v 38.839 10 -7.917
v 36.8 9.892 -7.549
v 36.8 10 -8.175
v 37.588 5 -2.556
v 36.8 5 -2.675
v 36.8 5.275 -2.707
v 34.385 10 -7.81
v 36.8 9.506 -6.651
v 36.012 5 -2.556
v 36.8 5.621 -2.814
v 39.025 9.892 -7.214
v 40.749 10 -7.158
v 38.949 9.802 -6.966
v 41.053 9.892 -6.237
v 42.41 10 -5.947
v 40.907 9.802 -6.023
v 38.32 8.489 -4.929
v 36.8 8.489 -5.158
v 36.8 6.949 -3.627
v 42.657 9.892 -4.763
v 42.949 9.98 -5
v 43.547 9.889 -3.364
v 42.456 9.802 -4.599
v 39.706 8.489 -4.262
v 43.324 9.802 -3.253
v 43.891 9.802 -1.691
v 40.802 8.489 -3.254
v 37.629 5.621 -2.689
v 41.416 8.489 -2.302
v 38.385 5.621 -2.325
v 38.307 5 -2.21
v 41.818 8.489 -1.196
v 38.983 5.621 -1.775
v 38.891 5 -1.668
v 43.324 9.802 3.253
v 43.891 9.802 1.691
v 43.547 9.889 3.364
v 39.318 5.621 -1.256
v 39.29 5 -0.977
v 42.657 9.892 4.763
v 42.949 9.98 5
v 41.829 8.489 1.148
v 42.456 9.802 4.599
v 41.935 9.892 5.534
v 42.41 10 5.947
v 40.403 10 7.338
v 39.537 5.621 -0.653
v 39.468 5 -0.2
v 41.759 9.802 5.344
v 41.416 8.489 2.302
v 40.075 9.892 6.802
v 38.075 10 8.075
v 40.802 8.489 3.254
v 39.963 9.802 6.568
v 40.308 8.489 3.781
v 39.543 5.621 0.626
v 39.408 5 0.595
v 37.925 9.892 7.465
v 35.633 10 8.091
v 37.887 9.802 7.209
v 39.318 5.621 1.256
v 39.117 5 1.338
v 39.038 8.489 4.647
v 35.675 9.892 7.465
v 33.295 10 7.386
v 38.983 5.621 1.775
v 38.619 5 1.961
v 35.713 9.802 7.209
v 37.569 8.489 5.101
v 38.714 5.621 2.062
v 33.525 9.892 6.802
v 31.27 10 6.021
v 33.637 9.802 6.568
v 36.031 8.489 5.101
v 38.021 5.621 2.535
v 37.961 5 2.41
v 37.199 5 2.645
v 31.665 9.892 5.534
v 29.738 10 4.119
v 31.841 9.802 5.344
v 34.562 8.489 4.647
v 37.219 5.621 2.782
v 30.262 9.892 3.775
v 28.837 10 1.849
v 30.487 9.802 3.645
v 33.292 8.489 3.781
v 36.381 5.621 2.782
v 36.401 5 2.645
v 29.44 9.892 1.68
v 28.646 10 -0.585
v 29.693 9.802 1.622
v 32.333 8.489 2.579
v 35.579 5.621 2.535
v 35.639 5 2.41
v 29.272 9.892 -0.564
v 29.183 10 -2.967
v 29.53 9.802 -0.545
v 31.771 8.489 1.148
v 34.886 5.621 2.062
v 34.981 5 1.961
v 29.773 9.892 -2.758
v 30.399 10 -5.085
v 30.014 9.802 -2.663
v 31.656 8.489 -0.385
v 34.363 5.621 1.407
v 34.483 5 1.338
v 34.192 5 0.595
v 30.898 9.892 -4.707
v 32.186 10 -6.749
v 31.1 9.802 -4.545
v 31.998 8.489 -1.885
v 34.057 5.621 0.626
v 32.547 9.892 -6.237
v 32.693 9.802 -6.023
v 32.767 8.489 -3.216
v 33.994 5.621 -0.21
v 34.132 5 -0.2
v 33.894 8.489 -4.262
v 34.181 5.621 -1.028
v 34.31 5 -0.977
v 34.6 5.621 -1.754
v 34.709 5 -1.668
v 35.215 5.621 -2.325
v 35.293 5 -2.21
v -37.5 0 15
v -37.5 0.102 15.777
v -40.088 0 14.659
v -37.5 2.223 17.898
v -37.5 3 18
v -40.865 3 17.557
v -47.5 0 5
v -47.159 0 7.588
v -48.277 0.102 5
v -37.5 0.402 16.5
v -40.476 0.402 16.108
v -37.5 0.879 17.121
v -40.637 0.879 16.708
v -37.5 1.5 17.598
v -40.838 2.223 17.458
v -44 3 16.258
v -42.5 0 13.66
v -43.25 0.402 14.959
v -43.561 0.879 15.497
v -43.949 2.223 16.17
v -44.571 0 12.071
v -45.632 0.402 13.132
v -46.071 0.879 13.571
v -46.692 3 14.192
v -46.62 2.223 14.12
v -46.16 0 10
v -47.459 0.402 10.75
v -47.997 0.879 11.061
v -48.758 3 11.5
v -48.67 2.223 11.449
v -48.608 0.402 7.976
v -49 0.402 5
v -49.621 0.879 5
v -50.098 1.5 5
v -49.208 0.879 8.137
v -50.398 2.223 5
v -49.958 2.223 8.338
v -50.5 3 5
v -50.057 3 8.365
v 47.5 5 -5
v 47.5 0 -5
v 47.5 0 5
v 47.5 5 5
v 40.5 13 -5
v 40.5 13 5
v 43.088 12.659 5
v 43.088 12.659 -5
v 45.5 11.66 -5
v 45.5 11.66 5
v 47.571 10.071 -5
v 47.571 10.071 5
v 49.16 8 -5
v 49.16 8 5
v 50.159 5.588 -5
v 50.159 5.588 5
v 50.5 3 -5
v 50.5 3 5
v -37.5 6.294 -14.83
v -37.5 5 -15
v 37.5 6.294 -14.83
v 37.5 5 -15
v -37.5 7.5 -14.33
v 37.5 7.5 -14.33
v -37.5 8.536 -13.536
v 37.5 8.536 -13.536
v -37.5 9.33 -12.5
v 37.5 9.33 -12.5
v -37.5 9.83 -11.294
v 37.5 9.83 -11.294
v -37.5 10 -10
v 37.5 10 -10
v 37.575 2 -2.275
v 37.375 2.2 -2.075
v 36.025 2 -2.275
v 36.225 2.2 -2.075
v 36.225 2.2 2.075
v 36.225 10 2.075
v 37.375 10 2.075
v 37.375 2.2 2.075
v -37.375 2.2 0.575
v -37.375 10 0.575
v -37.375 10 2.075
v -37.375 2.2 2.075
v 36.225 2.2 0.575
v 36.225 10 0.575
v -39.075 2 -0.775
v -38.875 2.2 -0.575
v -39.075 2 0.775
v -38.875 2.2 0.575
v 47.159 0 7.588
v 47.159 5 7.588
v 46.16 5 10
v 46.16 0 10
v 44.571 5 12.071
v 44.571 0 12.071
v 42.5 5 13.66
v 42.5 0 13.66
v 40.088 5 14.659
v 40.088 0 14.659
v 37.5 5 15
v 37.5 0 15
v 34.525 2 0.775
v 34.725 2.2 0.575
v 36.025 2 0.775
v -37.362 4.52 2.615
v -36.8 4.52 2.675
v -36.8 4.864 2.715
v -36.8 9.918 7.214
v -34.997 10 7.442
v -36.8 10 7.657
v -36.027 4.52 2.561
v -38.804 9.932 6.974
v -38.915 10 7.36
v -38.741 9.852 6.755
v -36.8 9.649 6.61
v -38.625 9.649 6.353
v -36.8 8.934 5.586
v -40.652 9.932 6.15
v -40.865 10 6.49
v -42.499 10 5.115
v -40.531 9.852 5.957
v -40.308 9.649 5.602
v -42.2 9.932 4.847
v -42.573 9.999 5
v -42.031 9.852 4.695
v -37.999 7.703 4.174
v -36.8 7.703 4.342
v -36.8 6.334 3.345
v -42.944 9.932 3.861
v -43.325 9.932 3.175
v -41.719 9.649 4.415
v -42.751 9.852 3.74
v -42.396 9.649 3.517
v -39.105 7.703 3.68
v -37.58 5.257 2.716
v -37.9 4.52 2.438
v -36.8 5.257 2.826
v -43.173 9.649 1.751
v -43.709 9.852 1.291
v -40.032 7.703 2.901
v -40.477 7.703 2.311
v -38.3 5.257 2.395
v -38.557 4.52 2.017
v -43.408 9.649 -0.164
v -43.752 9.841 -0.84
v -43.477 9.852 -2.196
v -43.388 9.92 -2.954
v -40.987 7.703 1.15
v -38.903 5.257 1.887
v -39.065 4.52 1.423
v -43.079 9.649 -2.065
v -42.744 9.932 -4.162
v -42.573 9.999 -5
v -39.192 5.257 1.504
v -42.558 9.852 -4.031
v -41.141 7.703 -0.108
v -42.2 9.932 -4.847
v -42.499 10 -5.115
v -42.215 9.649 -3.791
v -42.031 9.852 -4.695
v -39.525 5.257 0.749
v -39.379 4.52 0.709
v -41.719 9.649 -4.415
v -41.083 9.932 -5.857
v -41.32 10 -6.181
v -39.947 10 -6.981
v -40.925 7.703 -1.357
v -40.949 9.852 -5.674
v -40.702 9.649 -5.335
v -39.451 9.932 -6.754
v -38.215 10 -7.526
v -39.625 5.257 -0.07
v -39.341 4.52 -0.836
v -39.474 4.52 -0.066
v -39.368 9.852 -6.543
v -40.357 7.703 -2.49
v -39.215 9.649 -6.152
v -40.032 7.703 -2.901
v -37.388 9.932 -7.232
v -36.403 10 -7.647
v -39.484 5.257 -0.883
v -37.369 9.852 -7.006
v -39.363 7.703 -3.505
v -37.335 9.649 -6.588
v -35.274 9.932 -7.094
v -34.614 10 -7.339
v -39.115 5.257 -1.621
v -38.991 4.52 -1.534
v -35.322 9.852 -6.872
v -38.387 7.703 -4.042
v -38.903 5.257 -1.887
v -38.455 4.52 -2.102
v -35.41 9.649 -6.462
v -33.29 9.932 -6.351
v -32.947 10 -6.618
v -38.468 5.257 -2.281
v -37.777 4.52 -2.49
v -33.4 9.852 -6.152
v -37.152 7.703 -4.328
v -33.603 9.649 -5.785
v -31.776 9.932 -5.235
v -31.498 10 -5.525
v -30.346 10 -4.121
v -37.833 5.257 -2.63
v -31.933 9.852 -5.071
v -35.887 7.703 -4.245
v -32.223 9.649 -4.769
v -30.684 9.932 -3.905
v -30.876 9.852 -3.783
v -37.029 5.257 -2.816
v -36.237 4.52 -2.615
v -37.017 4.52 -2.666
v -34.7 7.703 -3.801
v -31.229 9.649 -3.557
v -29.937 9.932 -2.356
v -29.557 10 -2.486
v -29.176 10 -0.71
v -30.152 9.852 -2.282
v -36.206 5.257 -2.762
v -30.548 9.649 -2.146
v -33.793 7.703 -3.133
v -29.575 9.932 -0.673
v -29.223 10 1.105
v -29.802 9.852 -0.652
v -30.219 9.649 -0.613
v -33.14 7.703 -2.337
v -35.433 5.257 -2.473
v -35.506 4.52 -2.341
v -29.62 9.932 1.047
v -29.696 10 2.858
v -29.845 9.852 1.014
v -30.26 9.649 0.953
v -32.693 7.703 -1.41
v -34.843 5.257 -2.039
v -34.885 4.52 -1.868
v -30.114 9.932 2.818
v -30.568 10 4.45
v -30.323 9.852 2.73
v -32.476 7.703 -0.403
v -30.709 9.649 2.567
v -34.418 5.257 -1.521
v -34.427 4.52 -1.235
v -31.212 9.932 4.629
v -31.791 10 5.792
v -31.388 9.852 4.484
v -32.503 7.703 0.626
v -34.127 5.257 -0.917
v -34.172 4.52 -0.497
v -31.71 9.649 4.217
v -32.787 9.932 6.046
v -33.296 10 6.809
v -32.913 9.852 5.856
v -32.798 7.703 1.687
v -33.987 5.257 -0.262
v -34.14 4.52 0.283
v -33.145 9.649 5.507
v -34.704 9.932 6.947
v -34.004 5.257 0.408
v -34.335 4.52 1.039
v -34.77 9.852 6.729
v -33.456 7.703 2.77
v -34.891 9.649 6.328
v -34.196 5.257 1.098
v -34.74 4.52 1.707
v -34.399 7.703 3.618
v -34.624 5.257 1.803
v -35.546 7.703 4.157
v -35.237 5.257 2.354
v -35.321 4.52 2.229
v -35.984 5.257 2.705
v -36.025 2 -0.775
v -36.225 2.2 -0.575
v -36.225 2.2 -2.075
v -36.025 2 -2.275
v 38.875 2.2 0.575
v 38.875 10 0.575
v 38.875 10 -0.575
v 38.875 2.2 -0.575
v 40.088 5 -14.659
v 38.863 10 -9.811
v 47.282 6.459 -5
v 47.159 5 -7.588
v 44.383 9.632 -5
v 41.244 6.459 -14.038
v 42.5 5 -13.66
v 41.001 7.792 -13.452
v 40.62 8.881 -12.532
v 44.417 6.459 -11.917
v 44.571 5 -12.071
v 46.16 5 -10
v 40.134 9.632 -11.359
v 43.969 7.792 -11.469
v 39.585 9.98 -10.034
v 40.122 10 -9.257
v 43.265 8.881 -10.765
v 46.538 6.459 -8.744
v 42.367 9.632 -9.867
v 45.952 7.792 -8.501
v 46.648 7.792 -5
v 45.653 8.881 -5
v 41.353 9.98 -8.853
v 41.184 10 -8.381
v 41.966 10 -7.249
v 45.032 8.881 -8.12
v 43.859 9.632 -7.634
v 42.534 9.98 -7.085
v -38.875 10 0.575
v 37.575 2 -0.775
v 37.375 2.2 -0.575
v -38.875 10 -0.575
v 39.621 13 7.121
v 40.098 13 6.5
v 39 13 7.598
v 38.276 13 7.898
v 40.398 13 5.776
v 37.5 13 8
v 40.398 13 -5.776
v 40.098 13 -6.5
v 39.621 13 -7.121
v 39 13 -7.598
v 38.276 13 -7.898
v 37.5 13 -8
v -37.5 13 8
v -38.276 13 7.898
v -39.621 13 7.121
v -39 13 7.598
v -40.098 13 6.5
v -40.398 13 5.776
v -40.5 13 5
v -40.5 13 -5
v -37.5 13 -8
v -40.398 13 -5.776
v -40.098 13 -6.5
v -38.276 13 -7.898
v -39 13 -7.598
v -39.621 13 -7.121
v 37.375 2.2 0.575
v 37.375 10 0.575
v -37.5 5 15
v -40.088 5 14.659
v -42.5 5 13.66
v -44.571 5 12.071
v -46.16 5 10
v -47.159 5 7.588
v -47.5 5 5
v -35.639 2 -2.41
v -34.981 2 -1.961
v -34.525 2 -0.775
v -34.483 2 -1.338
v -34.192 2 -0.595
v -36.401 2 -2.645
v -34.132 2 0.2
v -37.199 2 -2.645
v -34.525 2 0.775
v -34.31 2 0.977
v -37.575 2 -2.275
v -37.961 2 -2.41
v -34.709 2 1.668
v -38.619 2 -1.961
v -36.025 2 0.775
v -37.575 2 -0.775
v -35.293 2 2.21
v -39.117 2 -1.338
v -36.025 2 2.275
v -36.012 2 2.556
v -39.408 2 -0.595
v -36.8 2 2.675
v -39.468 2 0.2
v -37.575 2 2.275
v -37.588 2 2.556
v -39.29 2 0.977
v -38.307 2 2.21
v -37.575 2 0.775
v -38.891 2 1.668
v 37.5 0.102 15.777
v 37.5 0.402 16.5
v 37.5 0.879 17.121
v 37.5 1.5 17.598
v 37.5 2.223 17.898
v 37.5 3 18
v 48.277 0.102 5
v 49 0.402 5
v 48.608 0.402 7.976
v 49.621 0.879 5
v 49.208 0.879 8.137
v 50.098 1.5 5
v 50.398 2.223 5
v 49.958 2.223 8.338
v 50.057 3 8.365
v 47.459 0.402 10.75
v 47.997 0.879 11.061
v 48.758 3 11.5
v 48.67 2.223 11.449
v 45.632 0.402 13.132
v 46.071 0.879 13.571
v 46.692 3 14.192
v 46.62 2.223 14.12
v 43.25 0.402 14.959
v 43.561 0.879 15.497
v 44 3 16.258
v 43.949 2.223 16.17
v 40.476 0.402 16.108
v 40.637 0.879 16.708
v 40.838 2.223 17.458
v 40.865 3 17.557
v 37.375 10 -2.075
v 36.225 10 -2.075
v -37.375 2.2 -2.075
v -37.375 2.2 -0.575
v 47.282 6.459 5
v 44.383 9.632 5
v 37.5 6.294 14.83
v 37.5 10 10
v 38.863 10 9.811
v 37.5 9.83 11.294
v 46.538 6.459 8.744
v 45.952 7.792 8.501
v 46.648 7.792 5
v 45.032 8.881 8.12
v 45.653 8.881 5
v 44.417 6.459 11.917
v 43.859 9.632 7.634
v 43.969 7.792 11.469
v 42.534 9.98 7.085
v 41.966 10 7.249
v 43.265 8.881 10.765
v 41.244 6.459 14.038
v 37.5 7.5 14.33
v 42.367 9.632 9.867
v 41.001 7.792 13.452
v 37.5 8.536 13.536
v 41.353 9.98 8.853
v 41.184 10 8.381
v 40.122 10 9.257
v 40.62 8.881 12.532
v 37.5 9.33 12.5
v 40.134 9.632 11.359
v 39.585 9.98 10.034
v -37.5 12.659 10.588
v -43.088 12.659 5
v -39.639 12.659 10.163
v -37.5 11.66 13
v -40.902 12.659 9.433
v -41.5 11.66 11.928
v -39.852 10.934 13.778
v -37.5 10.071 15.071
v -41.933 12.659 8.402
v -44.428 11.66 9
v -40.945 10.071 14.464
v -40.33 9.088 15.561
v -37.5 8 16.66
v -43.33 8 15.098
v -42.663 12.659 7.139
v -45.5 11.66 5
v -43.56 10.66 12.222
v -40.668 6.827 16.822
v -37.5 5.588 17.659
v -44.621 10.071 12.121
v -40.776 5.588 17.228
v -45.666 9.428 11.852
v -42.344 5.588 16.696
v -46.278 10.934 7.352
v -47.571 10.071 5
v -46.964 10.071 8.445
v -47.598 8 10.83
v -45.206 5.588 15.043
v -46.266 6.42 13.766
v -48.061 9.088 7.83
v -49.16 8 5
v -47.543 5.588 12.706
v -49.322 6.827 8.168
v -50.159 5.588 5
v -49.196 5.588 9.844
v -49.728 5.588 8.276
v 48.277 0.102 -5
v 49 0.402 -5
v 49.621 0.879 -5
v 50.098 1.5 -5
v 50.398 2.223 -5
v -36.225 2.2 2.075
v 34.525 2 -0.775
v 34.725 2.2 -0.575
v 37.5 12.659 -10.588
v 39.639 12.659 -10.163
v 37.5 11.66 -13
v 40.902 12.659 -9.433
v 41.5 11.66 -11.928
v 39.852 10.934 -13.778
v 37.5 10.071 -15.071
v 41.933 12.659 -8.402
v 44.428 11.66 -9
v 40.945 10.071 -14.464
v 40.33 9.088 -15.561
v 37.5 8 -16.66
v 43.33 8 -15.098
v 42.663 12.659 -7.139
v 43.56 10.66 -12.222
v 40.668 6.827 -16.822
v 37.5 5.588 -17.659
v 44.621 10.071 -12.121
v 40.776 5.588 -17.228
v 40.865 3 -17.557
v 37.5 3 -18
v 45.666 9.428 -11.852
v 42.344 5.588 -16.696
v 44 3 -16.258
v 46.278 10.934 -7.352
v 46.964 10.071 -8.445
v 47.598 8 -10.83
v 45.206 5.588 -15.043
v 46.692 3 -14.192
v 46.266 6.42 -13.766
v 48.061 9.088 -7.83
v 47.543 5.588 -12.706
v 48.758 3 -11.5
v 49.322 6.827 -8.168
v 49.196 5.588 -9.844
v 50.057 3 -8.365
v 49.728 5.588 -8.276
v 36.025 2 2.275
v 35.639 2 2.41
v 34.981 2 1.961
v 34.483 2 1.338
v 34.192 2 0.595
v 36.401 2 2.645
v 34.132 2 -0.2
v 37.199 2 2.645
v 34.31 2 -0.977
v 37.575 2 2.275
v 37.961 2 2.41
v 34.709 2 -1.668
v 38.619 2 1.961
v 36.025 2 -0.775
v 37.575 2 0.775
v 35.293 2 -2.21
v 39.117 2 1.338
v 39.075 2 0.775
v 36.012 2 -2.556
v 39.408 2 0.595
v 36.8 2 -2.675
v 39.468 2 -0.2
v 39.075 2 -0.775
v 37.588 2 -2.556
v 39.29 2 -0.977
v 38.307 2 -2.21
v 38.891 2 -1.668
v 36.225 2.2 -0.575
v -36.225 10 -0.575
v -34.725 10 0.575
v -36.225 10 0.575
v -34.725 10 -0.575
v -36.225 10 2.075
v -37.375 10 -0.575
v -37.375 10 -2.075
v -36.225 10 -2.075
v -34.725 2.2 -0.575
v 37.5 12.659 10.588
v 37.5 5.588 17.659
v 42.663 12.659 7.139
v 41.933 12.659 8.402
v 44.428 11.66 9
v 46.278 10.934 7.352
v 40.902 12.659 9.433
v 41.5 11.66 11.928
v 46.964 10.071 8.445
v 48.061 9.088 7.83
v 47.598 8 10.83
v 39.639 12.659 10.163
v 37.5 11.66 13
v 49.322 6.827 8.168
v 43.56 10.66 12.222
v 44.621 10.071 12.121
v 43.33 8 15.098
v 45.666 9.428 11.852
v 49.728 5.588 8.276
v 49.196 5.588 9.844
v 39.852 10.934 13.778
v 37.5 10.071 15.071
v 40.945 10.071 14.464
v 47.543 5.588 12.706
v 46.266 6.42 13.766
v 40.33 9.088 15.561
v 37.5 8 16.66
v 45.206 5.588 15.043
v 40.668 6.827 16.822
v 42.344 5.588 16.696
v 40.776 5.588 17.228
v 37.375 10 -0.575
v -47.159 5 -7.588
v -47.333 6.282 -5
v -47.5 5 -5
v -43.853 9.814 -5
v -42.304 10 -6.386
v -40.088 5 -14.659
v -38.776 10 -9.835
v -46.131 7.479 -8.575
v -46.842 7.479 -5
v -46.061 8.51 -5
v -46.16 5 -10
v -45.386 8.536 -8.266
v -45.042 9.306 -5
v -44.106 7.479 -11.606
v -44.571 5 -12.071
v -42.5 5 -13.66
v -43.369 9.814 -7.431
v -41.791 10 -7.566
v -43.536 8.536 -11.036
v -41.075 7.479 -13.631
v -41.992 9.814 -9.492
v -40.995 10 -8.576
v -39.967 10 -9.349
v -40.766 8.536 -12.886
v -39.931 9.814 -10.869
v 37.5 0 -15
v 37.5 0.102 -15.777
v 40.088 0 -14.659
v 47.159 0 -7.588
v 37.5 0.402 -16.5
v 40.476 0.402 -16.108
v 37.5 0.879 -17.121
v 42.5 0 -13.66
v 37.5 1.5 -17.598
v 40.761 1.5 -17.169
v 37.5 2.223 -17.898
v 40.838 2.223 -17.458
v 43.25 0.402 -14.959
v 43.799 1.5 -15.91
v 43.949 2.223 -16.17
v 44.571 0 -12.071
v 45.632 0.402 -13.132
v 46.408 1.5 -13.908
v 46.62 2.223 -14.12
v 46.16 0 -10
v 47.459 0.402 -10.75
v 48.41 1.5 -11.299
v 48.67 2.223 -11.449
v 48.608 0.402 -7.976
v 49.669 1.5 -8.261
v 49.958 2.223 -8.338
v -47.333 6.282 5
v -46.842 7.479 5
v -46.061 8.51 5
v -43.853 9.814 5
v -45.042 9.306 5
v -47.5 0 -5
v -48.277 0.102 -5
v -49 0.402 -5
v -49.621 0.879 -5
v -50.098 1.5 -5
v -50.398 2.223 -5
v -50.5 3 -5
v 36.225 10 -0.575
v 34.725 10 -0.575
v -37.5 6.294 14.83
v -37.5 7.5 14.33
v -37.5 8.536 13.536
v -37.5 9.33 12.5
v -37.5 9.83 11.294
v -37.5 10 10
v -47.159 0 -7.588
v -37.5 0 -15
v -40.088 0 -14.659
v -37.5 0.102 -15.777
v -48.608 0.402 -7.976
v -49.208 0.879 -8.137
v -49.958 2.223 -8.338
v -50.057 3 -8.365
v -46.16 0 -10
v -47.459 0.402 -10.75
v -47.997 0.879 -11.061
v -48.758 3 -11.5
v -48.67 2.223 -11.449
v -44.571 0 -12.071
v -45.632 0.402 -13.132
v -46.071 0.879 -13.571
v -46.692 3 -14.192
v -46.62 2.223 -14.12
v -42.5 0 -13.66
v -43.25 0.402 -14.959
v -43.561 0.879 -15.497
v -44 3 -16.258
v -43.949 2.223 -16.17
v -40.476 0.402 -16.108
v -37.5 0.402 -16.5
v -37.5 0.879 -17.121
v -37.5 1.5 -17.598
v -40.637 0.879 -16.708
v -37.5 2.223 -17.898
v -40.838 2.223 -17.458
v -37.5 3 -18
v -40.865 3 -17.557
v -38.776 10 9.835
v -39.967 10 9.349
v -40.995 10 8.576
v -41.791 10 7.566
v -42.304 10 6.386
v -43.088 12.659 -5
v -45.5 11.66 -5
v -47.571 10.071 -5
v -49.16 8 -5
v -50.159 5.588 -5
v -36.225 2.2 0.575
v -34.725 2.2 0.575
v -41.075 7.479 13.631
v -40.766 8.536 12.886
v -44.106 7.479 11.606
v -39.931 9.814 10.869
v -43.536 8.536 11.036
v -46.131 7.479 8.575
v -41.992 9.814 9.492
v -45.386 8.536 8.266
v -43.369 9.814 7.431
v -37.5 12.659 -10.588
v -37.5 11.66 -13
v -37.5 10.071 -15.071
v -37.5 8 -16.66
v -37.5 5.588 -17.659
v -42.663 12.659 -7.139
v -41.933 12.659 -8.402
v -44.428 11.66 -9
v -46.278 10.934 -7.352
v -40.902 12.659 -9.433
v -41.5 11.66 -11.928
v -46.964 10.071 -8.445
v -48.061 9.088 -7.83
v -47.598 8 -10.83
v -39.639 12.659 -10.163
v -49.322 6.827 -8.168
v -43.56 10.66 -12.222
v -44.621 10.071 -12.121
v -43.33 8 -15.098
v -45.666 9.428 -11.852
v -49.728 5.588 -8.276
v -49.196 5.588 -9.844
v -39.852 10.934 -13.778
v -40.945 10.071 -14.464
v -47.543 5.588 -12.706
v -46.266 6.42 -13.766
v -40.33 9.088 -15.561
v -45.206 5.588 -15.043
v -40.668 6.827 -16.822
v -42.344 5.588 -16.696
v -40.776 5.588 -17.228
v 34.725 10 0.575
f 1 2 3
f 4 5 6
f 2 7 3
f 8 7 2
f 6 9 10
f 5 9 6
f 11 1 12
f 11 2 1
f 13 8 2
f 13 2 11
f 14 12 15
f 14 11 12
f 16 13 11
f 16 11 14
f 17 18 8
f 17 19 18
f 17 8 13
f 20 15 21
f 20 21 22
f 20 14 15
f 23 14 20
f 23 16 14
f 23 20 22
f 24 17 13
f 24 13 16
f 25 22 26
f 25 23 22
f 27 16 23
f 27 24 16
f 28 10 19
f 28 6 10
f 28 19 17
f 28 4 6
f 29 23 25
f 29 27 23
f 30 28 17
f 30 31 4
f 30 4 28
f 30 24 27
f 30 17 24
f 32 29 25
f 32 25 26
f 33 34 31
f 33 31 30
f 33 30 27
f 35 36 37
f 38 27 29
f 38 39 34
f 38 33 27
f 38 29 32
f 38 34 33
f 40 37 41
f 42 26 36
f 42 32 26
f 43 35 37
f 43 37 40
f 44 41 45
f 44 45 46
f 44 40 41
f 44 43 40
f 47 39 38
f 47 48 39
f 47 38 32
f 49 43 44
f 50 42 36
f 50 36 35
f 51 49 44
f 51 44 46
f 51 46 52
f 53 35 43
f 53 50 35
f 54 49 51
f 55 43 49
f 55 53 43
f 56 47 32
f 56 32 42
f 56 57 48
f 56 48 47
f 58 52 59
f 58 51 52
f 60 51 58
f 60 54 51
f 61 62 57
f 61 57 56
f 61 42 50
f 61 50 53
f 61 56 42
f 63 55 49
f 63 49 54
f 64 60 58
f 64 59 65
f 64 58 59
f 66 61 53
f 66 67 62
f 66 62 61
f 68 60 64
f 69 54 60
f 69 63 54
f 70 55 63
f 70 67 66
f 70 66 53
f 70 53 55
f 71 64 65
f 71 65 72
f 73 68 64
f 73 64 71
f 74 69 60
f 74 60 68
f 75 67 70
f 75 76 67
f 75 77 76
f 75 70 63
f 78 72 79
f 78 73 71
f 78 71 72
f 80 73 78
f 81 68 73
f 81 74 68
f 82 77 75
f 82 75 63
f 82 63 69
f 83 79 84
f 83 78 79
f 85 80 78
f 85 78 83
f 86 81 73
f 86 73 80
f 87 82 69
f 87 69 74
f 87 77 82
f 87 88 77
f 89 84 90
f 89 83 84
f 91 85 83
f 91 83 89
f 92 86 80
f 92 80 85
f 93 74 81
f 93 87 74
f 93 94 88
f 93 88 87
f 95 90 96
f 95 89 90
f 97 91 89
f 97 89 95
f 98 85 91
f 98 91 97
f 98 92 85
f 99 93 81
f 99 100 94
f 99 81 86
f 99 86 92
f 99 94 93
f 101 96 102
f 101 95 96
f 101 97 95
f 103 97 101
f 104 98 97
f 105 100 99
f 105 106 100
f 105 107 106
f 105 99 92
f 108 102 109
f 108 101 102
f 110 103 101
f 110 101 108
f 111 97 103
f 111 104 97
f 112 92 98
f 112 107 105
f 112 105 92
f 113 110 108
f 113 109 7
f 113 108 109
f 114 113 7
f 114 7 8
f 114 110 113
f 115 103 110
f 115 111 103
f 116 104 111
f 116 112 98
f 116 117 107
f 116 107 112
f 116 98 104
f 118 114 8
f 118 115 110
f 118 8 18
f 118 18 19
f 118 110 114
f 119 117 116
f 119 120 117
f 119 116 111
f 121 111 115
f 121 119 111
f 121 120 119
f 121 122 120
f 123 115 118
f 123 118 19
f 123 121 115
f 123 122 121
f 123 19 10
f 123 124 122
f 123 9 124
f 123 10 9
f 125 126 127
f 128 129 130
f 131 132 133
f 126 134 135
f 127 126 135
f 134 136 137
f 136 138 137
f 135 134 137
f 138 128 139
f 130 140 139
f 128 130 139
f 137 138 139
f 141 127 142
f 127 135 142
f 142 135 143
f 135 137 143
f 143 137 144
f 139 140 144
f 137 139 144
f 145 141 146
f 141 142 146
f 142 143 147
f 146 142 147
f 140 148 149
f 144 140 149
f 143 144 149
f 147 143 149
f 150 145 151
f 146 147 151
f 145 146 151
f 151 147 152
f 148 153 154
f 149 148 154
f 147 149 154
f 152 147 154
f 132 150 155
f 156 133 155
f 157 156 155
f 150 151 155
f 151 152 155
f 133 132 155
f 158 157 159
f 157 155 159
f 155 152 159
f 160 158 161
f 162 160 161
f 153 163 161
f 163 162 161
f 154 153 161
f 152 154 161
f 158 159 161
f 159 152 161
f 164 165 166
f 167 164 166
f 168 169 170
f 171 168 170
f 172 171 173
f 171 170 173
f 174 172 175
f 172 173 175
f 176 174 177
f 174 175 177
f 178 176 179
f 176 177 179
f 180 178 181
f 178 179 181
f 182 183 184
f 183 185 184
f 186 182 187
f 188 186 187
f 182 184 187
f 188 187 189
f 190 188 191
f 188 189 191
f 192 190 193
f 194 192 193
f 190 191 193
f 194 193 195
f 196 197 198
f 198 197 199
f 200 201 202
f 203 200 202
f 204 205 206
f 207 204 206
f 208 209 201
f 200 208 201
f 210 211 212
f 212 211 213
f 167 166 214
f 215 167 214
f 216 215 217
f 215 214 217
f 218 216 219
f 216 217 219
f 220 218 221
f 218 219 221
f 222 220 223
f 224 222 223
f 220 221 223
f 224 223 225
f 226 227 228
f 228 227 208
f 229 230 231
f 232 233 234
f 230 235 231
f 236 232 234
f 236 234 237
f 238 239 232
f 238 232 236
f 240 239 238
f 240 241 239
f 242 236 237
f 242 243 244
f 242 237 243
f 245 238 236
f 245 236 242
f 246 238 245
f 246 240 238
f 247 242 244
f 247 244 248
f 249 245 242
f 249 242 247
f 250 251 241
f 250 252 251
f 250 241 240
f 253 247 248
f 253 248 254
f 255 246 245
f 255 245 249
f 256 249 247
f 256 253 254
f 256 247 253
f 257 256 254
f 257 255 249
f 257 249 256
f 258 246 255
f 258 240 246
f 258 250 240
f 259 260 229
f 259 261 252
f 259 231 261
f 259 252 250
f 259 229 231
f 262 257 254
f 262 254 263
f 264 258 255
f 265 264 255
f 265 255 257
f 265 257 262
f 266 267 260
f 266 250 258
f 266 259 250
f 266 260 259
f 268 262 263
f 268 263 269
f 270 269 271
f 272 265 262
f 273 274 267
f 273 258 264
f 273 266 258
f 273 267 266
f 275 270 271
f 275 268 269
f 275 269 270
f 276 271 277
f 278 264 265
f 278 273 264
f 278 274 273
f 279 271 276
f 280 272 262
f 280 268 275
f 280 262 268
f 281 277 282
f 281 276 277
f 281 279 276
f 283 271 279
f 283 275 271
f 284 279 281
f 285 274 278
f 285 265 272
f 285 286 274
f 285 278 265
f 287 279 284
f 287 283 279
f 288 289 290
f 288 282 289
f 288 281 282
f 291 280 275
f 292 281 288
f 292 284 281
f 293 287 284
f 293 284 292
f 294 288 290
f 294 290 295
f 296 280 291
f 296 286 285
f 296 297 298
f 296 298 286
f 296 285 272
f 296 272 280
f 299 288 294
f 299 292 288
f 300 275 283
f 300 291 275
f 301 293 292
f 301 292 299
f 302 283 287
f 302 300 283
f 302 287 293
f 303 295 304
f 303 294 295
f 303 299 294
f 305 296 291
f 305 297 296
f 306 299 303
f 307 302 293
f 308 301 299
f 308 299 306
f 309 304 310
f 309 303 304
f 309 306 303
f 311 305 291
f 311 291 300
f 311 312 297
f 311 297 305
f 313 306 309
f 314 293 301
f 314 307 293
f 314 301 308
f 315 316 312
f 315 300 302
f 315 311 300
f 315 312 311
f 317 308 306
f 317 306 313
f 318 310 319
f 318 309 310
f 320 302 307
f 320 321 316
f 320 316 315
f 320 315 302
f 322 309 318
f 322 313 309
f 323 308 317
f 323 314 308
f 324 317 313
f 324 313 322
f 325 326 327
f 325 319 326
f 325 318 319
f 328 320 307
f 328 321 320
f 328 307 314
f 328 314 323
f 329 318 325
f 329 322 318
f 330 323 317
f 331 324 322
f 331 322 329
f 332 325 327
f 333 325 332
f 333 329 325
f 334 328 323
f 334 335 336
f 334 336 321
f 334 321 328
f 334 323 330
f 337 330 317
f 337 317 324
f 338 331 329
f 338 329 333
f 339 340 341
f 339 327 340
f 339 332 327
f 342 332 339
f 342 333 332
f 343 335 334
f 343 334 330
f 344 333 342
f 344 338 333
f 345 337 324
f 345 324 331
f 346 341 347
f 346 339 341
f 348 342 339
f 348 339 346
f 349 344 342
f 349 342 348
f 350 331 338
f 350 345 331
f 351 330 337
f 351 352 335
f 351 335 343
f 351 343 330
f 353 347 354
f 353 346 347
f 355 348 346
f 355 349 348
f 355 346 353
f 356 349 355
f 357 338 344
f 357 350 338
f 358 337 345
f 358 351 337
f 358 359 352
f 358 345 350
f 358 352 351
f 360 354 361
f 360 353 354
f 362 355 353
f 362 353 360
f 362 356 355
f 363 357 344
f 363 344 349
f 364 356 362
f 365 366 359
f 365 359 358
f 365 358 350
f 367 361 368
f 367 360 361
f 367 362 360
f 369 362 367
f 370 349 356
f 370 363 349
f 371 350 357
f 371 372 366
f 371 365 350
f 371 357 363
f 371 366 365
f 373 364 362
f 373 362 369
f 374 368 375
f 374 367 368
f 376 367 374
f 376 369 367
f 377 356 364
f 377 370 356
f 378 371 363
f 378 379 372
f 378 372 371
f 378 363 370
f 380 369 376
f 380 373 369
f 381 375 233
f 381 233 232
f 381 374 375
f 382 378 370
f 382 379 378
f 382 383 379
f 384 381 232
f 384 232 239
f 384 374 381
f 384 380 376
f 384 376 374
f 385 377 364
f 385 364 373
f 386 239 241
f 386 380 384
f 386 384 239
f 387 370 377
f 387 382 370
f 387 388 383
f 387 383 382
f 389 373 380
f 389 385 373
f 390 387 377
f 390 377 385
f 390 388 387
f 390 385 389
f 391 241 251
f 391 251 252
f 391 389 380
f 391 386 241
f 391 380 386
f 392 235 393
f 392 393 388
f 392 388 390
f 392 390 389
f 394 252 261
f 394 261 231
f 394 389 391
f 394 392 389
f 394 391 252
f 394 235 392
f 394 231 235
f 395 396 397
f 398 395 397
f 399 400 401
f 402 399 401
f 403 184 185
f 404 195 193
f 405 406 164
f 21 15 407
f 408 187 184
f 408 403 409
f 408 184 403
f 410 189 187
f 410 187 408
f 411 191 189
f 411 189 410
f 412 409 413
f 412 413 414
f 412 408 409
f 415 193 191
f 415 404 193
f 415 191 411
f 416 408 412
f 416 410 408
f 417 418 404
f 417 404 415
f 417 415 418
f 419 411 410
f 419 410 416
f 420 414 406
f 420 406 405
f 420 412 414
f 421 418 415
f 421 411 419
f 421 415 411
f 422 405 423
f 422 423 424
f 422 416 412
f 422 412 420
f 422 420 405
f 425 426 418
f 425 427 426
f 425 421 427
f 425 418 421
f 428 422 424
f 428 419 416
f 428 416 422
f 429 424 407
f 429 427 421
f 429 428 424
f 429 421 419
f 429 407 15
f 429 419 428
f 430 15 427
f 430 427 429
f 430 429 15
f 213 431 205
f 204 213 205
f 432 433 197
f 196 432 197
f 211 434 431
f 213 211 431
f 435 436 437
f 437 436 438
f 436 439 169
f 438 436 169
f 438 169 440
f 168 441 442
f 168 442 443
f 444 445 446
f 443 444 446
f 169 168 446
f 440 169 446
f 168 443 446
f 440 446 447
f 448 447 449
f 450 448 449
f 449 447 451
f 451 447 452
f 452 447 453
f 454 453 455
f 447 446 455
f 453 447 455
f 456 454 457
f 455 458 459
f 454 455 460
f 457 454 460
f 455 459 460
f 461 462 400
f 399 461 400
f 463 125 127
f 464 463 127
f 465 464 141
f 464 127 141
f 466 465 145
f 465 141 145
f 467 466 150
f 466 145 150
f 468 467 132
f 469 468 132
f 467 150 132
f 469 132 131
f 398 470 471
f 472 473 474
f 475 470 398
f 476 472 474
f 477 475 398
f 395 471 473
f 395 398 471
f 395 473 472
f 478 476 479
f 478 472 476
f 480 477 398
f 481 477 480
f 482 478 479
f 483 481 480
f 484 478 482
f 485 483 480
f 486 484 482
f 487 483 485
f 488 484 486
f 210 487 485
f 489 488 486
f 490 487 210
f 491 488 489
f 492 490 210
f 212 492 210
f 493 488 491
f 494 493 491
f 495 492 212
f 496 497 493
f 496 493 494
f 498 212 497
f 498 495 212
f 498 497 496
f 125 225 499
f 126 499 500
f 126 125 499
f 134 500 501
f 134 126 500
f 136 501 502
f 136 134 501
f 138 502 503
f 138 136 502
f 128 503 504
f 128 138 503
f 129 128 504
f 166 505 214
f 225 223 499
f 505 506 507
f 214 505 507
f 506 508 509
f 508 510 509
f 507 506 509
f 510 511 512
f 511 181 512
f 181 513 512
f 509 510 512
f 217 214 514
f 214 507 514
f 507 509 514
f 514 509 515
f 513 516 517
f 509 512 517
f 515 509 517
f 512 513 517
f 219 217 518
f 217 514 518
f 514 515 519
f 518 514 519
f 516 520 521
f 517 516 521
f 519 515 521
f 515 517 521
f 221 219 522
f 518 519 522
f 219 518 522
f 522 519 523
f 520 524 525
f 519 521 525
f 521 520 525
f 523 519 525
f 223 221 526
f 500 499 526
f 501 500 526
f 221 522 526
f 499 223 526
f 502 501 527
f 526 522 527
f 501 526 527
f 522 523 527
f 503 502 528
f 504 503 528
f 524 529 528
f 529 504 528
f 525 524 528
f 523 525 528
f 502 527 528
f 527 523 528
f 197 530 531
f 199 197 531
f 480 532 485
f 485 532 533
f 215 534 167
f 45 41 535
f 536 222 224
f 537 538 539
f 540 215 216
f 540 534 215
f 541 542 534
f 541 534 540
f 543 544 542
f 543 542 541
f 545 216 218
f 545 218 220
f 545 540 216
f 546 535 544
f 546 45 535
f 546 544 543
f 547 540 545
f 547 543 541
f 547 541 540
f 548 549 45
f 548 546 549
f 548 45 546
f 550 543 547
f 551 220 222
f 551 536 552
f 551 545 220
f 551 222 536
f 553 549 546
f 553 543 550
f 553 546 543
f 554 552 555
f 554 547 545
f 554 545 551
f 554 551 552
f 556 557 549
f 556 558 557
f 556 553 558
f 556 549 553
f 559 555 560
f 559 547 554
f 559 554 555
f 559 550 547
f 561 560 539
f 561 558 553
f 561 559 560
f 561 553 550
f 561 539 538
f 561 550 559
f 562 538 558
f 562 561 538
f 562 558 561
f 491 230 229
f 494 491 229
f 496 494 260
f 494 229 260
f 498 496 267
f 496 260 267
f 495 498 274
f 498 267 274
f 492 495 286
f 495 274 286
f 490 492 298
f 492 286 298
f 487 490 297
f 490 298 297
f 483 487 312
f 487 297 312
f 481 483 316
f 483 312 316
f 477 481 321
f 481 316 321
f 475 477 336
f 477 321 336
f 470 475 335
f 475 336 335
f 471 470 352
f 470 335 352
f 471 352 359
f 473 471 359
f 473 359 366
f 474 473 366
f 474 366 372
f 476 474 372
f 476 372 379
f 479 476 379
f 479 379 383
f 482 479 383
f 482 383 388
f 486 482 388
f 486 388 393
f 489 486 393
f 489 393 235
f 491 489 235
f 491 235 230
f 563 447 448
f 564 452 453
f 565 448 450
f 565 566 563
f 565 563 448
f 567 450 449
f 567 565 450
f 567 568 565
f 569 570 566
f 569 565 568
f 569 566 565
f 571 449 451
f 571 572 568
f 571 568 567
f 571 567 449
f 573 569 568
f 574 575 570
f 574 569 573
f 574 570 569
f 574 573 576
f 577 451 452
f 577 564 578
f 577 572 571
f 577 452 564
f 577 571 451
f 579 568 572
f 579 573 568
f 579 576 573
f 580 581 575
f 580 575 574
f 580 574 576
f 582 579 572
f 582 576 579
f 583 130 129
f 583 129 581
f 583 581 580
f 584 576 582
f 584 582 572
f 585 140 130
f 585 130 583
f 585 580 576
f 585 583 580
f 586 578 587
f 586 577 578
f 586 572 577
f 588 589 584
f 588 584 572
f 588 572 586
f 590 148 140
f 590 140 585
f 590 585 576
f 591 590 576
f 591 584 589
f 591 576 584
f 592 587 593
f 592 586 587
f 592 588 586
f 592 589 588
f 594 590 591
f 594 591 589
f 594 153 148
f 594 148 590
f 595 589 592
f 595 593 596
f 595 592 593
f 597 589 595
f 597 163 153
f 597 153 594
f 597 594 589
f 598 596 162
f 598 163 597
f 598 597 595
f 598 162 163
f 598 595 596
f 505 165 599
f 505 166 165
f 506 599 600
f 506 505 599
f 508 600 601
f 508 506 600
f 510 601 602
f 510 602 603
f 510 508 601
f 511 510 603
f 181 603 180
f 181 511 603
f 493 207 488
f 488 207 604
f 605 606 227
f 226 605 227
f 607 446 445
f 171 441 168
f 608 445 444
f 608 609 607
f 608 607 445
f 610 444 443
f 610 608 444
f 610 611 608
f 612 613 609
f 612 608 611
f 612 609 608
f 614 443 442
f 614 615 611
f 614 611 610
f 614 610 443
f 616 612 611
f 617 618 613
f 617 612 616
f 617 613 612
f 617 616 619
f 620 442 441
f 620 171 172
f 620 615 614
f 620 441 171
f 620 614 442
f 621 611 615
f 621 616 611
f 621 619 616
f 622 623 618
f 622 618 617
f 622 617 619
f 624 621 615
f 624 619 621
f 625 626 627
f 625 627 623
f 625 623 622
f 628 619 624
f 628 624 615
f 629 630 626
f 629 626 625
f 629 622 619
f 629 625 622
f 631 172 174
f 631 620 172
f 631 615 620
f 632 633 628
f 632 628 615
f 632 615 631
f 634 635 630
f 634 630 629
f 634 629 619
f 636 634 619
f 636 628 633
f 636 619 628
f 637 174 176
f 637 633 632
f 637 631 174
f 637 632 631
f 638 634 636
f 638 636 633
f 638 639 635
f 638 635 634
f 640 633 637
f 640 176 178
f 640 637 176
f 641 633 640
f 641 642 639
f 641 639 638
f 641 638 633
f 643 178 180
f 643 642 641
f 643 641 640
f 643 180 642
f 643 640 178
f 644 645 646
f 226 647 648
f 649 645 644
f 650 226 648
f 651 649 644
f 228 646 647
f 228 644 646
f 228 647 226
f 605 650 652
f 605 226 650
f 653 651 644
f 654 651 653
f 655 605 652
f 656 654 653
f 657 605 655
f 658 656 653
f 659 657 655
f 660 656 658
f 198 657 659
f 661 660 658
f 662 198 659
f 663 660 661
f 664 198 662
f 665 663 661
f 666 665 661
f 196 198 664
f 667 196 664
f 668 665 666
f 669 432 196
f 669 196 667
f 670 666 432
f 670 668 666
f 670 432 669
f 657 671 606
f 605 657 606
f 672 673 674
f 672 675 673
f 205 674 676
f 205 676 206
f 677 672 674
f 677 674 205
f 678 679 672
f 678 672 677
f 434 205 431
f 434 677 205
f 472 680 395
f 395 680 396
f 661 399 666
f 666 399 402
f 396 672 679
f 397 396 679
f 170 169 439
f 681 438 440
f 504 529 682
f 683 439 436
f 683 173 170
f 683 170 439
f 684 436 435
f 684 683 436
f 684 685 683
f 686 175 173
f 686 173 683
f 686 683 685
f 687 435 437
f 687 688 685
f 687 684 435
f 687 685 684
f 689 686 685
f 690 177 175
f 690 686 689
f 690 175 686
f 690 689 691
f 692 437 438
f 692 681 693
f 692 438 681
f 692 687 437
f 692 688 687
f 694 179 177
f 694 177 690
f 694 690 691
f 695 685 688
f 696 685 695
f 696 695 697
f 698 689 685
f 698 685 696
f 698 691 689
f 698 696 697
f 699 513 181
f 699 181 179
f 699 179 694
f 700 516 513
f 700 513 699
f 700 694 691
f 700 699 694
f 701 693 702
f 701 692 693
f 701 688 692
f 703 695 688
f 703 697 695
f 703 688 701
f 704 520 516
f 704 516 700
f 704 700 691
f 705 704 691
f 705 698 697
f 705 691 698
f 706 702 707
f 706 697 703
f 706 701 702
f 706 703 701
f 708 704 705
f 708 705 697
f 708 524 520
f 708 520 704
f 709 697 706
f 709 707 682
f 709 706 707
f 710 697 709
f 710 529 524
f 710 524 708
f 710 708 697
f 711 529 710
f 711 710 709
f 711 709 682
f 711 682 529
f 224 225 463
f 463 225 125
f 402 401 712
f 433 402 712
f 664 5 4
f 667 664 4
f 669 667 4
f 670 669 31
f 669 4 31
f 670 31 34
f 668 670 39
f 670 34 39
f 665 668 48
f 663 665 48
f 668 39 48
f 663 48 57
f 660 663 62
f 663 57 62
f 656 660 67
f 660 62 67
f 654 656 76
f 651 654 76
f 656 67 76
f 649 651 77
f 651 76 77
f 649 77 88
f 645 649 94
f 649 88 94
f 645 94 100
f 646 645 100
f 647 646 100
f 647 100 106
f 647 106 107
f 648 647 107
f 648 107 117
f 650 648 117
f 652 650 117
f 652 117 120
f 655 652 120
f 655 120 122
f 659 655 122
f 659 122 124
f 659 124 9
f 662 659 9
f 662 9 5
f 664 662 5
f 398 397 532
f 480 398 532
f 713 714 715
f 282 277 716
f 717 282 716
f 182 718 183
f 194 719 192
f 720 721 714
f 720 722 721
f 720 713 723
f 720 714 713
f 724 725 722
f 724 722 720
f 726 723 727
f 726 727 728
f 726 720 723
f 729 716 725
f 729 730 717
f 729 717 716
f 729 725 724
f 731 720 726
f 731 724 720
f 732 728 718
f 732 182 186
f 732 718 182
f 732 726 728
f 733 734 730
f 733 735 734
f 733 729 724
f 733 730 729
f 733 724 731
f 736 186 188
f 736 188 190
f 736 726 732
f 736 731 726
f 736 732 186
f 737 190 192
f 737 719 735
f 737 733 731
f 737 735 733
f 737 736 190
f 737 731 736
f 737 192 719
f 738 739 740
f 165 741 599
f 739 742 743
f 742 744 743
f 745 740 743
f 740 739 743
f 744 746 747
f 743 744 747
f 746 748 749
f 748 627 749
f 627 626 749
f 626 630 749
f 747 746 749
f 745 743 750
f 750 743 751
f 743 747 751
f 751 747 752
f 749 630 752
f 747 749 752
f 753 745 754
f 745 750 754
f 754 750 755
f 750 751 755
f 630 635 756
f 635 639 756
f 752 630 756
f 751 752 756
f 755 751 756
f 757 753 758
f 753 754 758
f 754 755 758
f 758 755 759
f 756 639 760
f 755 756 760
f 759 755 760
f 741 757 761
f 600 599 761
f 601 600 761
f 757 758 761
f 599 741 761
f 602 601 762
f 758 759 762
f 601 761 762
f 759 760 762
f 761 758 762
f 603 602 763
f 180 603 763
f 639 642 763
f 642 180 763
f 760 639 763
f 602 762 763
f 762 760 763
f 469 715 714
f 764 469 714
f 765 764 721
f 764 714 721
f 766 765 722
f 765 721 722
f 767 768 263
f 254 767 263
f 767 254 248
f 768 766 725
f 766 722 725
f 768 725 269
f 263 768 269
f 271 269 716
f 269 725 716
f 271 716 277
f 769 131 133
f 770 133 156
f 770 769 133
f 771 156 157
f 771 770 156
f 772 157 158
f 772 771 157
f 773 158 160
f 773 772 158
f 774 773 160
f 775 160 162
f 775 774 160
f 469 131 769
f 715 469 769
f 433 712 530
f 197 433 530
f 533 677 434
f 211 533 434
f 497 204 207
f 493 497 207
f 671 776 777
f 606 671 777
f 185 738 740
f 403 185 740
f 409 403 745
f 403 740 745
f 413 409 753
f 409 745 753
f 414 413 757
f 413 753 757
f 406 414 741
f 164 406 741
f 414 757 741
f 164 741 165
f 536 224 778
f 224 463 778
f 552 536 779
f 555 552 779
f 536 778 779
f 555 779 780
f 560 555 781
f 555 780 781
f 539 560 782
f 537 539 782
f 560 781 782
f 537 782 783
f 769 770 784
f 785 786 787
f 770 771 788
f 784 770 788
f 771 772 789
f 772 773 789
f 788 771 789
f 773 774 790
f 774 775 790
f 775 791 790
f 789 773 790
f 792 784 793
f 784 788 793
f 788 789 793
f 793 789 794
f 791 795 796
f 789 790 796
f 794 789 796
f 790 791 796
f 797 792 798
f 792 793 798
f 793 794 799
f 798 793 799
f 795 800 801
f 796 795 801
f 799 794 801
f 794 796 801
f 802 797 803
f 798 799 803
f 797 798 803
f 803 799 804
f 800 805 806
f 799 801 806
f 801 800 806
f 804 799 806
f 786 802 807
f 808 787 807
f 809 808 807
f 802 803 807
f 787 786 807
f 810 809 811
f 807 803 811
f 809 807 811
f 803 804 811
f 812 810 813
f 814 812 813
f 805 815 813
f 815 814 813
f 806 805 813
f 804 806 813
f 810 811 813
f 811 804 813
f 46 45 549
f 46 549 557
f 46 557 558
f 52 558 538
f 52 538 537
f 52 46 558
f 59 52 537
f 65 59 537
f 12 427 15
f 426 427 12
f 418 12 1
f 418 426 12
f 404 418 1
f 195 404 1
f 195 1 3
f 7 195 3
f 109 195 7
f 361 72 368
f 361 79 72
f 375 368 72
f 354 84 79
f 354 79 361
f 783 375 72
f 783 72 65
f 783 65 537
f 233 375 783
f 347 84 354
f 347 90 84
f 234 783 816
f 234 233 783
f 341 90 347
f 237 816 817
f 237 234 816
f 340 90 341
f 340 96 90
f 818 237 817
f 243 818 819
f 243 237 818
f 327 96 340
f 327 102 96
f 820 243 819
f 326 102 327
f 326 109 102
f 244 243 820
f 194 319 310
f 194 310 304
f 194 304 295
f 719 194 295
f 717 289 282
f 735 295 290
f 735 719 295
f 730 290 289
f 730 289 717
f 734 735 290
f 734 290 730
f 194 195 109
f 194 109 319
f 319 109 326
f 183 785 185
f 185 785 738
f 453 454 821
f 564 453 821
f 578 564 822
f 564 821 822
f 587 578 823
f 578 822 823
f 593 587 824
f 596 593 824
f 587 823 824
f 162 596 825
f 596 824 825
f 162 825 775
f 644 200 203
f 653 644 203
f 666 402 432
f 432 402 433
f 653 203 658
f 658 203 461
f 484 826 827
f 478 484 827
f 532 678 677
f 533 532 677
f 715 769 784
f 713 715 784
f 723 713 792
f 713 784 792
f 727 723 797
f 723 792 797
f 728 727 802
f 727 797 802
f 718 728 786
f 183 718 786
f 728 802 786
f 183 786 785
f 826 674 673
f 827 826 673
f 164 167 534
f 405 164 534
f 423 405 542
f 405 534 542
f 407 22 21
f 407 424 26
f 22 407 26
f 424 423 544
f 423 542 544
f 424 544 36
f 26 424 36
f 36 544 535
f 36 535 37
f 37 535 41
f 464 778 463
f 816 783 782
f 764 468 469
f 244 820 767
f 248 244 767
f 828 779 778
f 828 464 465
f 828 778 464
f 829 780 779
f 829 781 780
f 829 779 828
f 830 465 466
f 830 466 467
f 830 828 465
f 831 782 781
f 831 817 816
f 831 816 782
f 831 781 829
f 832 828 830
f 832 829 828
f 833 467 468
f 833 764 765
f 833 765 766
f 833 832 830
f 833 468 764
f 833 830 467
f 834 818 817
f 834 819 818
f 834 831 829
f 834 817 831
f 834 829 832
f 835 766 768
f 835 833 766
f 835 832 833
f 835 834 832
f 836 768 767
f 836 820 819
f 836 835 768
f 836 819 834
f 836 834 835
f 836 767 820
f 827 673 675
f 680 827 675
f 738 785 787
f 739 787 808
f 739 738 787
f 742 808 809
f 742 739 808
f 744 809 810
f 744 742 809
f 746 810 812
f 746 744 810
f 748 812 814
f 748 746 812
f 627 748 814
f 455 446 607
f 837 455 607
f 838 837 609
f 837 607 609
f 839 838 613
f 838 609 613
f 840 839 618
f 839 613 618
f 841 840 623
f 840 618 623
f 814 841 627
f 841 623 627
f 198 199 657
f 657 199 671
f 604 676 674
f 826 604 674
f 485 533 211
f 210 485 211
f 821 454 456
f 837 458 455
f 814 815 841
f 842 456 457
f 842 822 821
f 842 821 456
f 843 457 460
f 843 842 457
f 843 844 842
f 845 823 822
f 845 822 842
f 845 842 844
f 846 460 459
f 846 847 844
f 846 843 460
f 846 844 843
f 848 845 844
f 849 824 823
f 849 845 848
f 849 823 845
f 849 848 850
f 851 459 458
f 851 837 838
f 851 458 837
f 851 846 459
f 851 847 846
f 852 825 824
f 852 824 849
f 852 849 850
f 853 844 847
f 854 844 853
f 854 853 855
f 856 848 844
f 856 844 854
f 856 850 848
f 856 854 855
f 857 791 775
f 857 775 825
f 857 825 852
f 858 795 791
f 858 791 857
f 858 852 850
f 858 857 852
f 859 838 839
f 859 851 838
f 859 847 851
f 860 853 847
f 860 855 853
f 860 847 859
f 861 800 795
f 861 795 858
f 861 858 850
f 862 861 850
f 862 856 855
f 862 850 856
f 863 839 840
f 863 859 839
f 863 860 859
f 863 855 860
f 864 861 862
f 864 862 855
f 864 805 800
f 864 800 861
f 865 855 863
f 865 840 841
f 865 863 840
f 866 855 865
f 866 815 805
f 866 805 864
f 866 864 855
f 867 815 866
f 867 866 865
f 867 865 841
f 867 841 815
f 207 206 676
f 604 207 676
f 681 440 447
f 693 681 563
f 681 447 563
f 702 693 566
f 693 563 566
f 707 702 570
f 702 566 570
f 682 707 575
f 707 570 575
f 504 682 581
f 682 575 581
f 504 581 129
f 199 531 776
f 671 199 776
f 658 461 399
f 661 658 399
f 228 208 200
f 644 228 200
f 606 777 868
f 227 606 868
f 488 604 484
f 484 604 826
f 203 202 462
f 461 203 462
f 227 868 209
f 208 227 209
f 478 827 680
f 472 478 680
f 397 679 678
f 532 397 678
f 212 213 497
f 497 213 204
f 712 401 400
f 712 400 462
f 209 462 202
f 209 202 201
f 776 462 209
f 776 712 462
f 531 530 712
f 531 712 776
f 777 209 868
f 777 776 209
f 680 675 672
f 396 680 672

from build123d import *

# Parameters (mm, degrees)
EXTRUDE_1_DEPTH = 10
SHELL_2_T       = 3
FILLET_3_R      = 10
FILLET_4_R      = 3
SKETCH_2_R      = 2.675
EXTRUDE_2_DEPTH = 8
FILLET_7_R      = 5
CHAMFER_1_SIZE  = 0.2
CHAMFER_2_SIZE  = 0.2
FILLET_9_SIZE   = 5.5
FILLET_9_SIZE_2 = 5


# Some blends are built 0.0001 mm under size
with BuildPart() as part:
    # 草图1 → 凸台-拉伸1 (new body)
    with BuildSketch(Plane(origin=(0, 0, 0), x_dir=(1, 0, 0), z_dir=(0, 1, 0))):
        with BuildLine():
            Line((-37.5, 15), (37.5, 15))
            ThreePointArc((37.5, 15), (44.571067812, 12.071067812), (47.5, 5))
            Line((47.5, 5), (47.5, -5))
            ThreePointArc((47.5, -5), (44.571067812, -12.071067812), (37.5, -15))
            Line((37.5, -15), (-37.5, -15))
            ThreePointArc((-37.5, -15), (-44.571067812, -12.071067812), (-47.5, -5))
            Line((-47.5, -5), (-47.5, 5))
            ThreePointArc((-47.5, 5), (-44.571067812, 12.071067812), (-37.5, 15))
        make_face()
    extrude(amount=EXTRUDE_1_DEPTH)

    # 抽壳2
    shell_2_openings = [part.faces().sort_by_distance(p)[0] for p in [
        (0, 0, 0),
    ]]
    offset(amount=SHELL_2_T, openings=shell_2_openings, kind=Kind.INTERSECTION)

    # 圆角3
    # the kernel refuses this fillet: 10 mm, written as the material it takes off along each edge
    with BuildSketch(Plane(origin=(37.5, 13, 5), x_dir=(1, 0, 0), z_dir=(0, 0, -1))) as fillet_3_piece_1:
        with BuildLine():
            CenterArc((13 - FILLET_3_R, FILLET_3_R), FILLET_3_R, 270, 90)
            Line((13 - FILLET_3_R, 0), (13, 0))
            Line((13, 0), (13, FILLET_3_R))
        make_face()
    revolve(axis=Axis((37.5, 13, 5), (0, -1, 0)), revolution_arc=90, mode=Mode.SUBTRACT)
    with BuildSketch(Plane(origin=(50.5, 13, 5), x_dir=(0, -1, 0), z_dir=(0, 0, -1)), Plane(origin=(-50.5, 13, -5), x_dir=(0, -1, 0), z_dir=(0, 0, 1))) as fillet_3_piece_2:
        with BuildLine():
            CenterArc((FILLET_3_R, FILLET_3_R), FILLET_3_R, 180, 90)
            Line((0, FILLET_3_R), (0, 0))
            Line((0, 0), (FILLET_3_R, 0))
        make_face()
    extrude(amount=10, mode=Mode.SUBTRACT)
    with BuildSketch(Plane(origin=(37.5, 13, -5), x_dir=(0, 0, -1), z_dir=(-1, 0, 0))) as fillet_3_piece_3:
        with BuildLine():
            CenterArc((13 - FILLET_3_R, FILLET_3_R), FILLET_3_R, 270, 90)
            Line((13 - FILLET_3_R, 0), (13, 0))
            Line((13, 0), (13, FILLET_3_R))
        make_face()
    revolve(axis=Axis((37.5, 13, -5), (0, -1, 0)), revolution_arc=90, mode=Mode.SUBTRACT)
    with BuildSketch(Plane(origin=(37.5, 13, -18), x_dir=(0, -1, 0), z_dir=(-1, 0, 0)), Plane(origin=(-37.5, 13, 18), x_dir=(0, -1, 0), z_dir=(1, 0, 0))) as fillet_3_piece_4:
        with BuildLine():
            CenterArc((FILLET_3_R, FILLET_3_R), FILLET_3_R, 180, 90)
            Line((0, FILLET_3_R), (0, 0))
            Line((0, 0), (FILLET_3_R, 0))
        make_face()
    extrude(amount=75, mode=Mode.SUBTRACT)
    with BuildSketch(Plane(origin=(-37.5, 13, -5), x_dir=(-1, 0, 0), z_dir=(0, 0, 1))) as fillet_3_piece_5:
        with BuildLine():
            CenterArc((13 - FILLET_3_R, FILLET_3_R), FILLET_3_R, 270, 90)
            Line((13 - FILLET_3_R, 0), (13, 0))
            Line((13, 0), (13, FILLET_3_R))
        make_face()
    revolve(axis=Axis((-37.5, 13, -5), (0, -1, 0)), revolution_arc=90, mode=Mode.SUBTRACT)
    with BuildSketch(Plane(origin=(-37.5, 13, 5), x_dir=(0, 0, 1), z_dir=(1, 0, 0))) as fillet_3_piece_6:
        with BuildLine():
            CenterArc((13 - FILLET_3_R, FILLET_3_R), FILLET_3_R, 270, 90)
            Line((13 - FILLET_3_R, 0), (13, 0))
            Line((13, 0), (13, FILLET_3_R))
        make_face()
    revolve(axis=Axis((-37.5, 13, 5), (0, -1, 0)), revolution_arc=90, mode=Mode.SUBTRACT)

    # 圆角4
    fillet_4_edges = [part.edges().sort_by_distance(p)[0] for p in [
        (50.5, 0, 0),
        (46.692388155, 0, 14.192388155),
        (0, 0, 18),
        (-46.692388155, 0, 14.192388155),
        (-50.5, 0, 0),
        (-46.692388155, 0, -14.192388155),
        (0, 0, -18),
        (46.692388155, 0, -14.192388155),
    ]]
    fillet(fillet_4_edges, radius=FILLET_4_R - 0.0001)  # a hair under: the kernel refuses the full size

    # 草图2 → 凸台-拉伸2 (add)
    # profile 1 of 2: a face of its own
    with BuildSketch(Plane(origin=(0, 10, 0), x_dir=(-1, 0, 0), z_dir=(0, -1, 0))):
        with Locations(Location((36.8, 0, 0), (0, 0, 270))):
            Circle(SKETCH_2_R)
        Polygon((34.725, -0.575), (34.725, 0.575), (36.225, 0.575), (36.225, 2.075), (37.375, 2.075), (37.375, 0.575), (38.875, 0.575), (38.875, -0.575), (37.375, -0.575), (37.375, -2.075), (36.225, -2.075), (36.225, -0.575), align=None, mode=Mode.SUBTRACT)
    # profile 2 of 2: a face of its own
    with BuildSketch(Plane(origin=(0, 10, 0), x_dir=(-1, 0, 0), z_dir=(0, -1, 0))):
        with Locations(Location((-36.8, 0, 0), (0, 0, 90))):
            Circle(SKETCH_2_R)
        Polygon((-37.375, 0.575), (-37.375, 2.075), (-36.225, 2.075), (-36.225, 0.575), (-34.725, 0.575), (-34.725, -0.575), (-36.225, -0.575), (-36.225, -2.075), (-37.375, -2.075), (-37.375, -0.575), (-38.875, -0.575), (-38.875, 0.575), align=None, mode=Mode.SUBTRACT)
    extrude(amount=EXTRUDE_2_DEPTH)

    # 圆角7
    fillet_7_edges = [part.edges().sort_by_distance(p)[0] for p in [
        (-44.571067812, 10, 12.071067812),
        (0, 10, 15),
        (44.571067812, 10, 12.071067812),
        (47.5, 10, 0),
        (44.571067812, 10, -12.071067812),
        (0, 10, -15),
        (-44.571067812, 10, -12.071067812),
        (-47.5, 10, 0),
    ]]
    fillet(fillet_7_edges, radius=FILLET_7_R)

    # 倒角1
    chamfer_1_edges = [part.edges().sort_by_distance(p)[0] for p in [
        (35.475, 2, -0.575),
        (37.375, 2, 1.325),
        (38.875, 2, 0),
        (38.125, 2, -0.575),
        (37.375, 2, -1.325),
        (36.8, 2, -2.075),
        (34.725, 2, 0),
        (35.475, 2, 0.575),
        (36.225, 2, 1.325),
        (36.8, 2, 2.075),
        (38.125, 2, 0.575),
        (36.225, 2, -1.325),
    ]]
    chamfer(chamfer_1_edges, length=CHAMFER_1_SIZE)

    # 倒角2
    chamfer_2_edges = [part.edges().sort_by_distance(p)[0] for p in [
        (-36.8, 2, -2.075),
        (-37.375, 2, -1.325),
        (-38.125, 2, -0.575),
        (-38.875, 2, 0),
        (-37.375, 2, 1.325),
        (-35.475, 2, -0.575),
        (-38.125, 2, 0.575),
        (-36.8, 2, 2.075),
        (-36.225, 2, 1.325),
        (-35.475, 2, 0.575),
        (-34.725, 2, 0),
        (-36.225, 2, -1.325),
    ]]
    chamfer(chamfer_2_edges, length=CHAMFER_2_SIZE)

    # 圆角9
    # a fillet whose section is not a circle: 5.5, 5 mm, written as the material it adds along each edge
    with BuildSketch(Plane(origin=(36.8, 10, 0), x_dir=(0, 0, -1), z_dir=(-1, 0, 0))) as fillet_9_piece_1:
        with BuildLine():
            Bezier((2.675 + FILLET_9_SIZE, 0), (2.675, 0), (2.675, FILLET_9_SIZE_2), weights=[1, 0.333333333, 1])
            Line((2.675, FILLET_9_SIZE_2), (2.675, 0))
            Line((2.675, 0), (2.675 + FILLET_9_SIZE, 0))
        make_face()
    revolve(axis=Axis((36.8, 10, 0), (0, -1, 0)))

    # 圆角10
    # a fillet whose section is not a circle: 5.5, 5 mm, written as the material it adds along each edge (its section moved 0.00015 mm through the faces so that the kernel can cut it)
    with BuildSketch(Plane(origin=(-36.8, 10, 0), x_dir=(0, 0, 1), z_dir=(1, 0, 0))) as fillet_10_piece_1:
        with BuildLine():
            Bezier((7.675, -0.00015), (2.67485, -0.00015), (2.67485, 5.5), weights=[1, 0.333333333, 1])
            Line((2.67485, 5.5), (2.56485, 5.5))
            ThreePointArc((2.56485, 5.5), (2.565, 2.75), (2.565, 0))
            Line((2.565, 0), (2.675, -0.11))
            ThreePointArc((2.675, -0.11), (5.175, -0.11), (7.675, -0.11015))
            Line((7.675, -0.11015), (7.675, -0.00015))
        make_face()
    revolve(axis=Axis((-36.8, 10, 0), (0, -1, 0)))


solid = part.part
